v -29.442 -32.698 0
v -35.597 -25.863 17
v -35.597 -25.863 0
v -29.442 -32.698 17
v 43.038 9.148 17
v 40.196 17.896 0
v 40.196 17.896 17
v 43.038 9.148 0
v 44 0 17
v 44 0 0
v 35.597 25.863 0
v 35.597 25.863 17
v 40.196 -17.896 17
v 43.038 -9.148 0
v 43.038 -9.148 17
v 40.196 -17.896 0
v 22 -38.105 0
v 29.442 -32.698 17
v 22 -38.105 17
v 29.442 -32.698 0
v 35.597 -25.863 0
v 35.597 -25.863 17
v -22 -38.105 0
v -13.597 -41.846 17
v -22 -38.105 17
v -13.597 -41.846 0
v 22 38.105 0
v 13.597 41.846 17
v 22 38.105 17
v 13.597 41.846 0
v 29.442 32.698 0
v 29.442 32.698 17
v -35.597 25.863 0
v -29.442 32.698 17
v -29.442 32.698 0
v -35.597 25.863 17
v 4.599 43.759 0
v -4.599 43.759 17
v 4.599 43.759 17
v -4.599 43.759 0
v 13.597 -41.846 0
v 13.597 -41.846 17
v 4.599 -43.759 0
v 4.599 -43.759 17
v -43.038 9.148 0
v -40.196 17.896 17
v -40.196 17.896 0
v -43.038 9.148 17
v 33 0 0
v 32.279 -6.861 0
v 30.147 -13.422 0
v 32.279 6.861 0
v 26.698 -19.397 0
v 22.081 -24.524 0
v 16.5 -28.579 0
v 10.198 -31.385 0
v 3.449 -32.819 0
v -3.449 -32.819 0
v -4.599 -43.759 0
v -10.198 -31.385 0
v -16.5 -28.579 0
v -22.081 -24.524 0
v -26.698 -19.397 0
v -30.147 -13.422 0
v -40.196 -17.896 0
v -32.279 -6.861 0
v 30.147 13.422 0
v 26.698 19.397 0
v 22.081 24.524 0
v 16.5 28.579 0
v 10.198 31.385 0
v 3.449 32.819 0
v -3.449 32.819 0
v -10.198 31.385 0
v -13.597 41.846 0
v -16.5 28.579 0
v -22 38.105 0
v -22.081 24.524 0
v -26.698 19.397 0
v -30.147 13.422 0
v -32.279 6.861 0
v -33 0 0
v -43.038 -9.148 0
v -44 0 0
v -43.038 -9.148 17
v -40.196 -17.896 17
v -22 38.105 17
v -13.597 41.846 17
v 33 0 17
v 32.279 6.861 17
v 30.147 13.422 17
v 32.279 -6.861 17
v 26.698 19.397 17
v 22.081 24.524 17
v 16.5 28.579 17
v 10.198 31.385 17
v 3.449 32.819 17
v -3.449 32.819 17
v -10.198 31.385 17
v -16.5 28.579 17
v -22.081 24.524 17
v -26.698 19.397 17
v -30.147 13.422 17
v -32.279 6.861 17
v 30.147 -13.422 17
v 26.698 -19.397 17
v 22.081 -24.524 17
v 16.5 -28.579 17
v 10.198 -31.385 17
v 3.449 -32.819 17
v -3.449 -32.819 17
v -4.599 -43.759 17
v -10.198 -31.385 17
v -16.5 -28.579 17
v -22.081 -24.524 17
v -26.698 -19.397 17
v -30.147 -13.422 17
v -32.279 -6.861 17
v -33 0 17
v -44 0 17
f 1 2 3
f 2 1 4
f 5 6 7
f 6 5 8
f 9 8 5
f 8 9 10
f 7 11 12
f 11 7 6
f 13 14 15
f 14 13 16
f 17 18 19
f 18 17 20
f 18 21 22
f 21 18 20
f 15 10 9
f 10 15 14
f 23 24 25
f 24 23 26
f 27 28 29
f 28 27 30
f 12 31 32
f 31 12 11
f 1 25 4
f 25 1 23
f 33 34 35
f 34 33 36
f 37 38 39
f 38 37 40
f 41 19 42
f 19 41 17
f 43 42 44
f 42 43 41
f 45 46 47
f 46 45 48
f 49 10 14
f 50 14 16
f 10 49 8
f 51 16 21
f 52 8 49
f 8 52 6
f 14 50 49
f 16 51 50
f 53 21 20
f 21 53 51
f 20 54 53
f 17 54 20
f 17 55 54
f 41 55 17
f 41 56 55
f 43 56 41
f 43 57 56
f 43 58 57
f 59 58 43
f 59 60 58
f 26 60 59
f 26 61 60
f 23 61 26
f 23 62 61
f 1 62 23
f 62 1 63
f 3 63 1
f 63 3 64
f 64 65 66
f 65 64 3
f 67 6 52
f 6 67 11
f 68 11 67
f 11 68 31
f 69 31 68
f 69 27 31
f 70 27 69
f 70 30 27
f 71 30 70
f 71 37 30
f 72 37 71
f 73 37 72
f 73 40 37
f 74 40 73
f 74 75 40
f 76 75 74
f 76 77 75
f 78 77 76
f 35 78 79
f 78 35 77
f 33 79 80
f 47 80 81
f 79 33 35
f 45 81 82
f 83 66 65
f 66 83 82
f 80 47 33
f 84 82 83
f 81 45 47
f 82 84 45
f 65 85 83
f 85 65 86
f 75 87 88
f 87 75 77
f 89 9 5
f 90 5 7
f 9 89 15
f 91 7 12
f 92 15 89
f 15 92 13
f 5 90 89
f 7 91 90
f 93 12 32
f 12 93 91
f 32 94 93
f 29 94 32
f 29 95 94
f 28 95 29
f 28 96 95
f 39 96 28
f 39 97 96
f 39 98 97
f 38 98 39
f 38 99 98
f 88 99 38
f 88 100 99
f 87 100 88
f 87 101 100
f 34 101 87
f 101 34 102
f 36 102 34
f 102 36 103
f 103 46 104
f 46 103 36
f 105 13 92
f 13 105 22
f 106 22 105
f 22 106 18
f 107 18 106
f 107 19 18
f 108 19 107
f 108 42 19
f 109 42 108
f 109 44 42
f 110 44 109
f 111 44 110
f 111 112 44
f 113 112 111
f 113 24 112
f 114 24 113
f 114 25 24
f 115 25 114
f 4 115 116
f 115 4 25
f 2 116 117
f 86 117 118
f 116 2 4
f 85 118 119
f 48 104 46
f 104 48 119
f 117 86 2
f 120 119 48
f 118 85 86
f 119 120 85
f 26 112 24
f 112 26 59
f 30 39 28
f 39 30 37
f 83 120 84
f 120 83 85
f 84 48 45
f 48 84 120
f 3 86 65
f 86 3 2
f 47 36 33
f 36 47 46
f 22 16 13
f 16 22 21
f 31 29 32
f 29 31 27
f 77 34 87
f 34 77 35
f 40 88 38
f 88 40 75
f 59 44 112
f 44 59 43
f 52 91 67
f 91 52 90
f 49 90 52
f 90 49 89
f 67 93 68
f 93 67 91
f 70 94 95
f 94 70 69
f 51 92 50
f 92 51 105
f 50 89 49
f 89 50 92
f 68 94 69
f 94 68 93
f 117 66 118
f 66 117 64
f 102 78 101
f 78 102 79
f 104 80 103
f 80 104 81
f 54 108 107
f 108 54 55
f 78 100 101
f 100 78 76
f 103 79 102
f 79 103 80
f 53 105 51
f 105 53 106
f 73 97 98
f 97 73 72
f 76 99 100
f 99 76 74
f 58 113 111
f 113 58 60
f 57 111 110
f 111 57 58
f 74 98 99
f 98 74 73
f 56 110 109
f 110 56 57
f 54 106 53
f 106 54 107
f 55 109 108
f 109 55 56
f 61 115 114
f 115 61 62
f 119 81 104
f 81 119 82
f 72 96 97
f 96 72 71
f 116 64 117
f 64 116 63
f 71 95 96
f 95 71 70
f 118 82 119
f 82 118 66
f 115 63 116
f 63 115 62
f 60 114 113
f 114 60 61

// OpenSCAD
// file: params.scad
// GLOBAL
hole_radius = 5;
peg_radius = 4.5;

// MAGNET
mag_height = 7;
mag_ring_ir = 50.8;
mag_ring_or = 101.6;
mag_count = 16;

// BEARING
bearing_height = 17;
bearing_ir = 33;
bearing_or = 44;

// STATOR
stator_height = 20;
stator_inner_height = 10;
stator_bearing_inset = (stator_height/2) - 1;
stator_count = 6;
stator_incidence = 360/stator_count;
stator_radius = 115;
stator_tab_width = 10;
stator_tab_offset = 50;
stator_wiring_gap = 25;
stator_wiring_gap_inset = stator_radius - (stator_wiring_gap + 10);
stator_outer_tab_extrude = 15;
stator_outer_tab_width = 30;
stator_notch = 15;
stator_notch_width = 5;
coil_edge = 80;

// ROTOR & ROTOR CAP
rotor_height = 10;
rotor_inner_height = 3;
rotor_radius = 105;
rotor_inner_diameter = 25;
rotor_count = 8;
rotor_incidence = 360/rotor_count;
rotor_tie_hole_offset = 30;

rotor_cap_radius = 50;
rotor_cap_peg_radius = 35;
rotor_cap_inner_radius = 10;
rotor_cap_height = 10;
rotor_cap_insert_height = 10;
rotor_cap_bearing_inset = (bearing_height + rotor_inner_height) - rotor_cap_height;
rotor_plate_height = 5;
blade_holder_edge = 20;

// ROTOR EDGE TIE
rotor_edge_tie_length = 40;
rotor_edge_tie_width = 20;
rotor_edge_tie_inner_height = 5;
rotor_edge_tie_height = 15;
rotor_edge_tie_peg_inset = 10;
// main file
/*
 * DISCLAIMER!
 * THIS IS NOT A PRINTED PART
 * IT IS A PLACEHOLDER FOR A THIRD-PARTY BEARING
 */
include <params.scad>

module bearing() {
  difference() {
    cylinder(h=bearing_height,  r=bearing_or);
    cylinder(h=bearing_height, r=bearing_ir);
  }
}

bearing();
